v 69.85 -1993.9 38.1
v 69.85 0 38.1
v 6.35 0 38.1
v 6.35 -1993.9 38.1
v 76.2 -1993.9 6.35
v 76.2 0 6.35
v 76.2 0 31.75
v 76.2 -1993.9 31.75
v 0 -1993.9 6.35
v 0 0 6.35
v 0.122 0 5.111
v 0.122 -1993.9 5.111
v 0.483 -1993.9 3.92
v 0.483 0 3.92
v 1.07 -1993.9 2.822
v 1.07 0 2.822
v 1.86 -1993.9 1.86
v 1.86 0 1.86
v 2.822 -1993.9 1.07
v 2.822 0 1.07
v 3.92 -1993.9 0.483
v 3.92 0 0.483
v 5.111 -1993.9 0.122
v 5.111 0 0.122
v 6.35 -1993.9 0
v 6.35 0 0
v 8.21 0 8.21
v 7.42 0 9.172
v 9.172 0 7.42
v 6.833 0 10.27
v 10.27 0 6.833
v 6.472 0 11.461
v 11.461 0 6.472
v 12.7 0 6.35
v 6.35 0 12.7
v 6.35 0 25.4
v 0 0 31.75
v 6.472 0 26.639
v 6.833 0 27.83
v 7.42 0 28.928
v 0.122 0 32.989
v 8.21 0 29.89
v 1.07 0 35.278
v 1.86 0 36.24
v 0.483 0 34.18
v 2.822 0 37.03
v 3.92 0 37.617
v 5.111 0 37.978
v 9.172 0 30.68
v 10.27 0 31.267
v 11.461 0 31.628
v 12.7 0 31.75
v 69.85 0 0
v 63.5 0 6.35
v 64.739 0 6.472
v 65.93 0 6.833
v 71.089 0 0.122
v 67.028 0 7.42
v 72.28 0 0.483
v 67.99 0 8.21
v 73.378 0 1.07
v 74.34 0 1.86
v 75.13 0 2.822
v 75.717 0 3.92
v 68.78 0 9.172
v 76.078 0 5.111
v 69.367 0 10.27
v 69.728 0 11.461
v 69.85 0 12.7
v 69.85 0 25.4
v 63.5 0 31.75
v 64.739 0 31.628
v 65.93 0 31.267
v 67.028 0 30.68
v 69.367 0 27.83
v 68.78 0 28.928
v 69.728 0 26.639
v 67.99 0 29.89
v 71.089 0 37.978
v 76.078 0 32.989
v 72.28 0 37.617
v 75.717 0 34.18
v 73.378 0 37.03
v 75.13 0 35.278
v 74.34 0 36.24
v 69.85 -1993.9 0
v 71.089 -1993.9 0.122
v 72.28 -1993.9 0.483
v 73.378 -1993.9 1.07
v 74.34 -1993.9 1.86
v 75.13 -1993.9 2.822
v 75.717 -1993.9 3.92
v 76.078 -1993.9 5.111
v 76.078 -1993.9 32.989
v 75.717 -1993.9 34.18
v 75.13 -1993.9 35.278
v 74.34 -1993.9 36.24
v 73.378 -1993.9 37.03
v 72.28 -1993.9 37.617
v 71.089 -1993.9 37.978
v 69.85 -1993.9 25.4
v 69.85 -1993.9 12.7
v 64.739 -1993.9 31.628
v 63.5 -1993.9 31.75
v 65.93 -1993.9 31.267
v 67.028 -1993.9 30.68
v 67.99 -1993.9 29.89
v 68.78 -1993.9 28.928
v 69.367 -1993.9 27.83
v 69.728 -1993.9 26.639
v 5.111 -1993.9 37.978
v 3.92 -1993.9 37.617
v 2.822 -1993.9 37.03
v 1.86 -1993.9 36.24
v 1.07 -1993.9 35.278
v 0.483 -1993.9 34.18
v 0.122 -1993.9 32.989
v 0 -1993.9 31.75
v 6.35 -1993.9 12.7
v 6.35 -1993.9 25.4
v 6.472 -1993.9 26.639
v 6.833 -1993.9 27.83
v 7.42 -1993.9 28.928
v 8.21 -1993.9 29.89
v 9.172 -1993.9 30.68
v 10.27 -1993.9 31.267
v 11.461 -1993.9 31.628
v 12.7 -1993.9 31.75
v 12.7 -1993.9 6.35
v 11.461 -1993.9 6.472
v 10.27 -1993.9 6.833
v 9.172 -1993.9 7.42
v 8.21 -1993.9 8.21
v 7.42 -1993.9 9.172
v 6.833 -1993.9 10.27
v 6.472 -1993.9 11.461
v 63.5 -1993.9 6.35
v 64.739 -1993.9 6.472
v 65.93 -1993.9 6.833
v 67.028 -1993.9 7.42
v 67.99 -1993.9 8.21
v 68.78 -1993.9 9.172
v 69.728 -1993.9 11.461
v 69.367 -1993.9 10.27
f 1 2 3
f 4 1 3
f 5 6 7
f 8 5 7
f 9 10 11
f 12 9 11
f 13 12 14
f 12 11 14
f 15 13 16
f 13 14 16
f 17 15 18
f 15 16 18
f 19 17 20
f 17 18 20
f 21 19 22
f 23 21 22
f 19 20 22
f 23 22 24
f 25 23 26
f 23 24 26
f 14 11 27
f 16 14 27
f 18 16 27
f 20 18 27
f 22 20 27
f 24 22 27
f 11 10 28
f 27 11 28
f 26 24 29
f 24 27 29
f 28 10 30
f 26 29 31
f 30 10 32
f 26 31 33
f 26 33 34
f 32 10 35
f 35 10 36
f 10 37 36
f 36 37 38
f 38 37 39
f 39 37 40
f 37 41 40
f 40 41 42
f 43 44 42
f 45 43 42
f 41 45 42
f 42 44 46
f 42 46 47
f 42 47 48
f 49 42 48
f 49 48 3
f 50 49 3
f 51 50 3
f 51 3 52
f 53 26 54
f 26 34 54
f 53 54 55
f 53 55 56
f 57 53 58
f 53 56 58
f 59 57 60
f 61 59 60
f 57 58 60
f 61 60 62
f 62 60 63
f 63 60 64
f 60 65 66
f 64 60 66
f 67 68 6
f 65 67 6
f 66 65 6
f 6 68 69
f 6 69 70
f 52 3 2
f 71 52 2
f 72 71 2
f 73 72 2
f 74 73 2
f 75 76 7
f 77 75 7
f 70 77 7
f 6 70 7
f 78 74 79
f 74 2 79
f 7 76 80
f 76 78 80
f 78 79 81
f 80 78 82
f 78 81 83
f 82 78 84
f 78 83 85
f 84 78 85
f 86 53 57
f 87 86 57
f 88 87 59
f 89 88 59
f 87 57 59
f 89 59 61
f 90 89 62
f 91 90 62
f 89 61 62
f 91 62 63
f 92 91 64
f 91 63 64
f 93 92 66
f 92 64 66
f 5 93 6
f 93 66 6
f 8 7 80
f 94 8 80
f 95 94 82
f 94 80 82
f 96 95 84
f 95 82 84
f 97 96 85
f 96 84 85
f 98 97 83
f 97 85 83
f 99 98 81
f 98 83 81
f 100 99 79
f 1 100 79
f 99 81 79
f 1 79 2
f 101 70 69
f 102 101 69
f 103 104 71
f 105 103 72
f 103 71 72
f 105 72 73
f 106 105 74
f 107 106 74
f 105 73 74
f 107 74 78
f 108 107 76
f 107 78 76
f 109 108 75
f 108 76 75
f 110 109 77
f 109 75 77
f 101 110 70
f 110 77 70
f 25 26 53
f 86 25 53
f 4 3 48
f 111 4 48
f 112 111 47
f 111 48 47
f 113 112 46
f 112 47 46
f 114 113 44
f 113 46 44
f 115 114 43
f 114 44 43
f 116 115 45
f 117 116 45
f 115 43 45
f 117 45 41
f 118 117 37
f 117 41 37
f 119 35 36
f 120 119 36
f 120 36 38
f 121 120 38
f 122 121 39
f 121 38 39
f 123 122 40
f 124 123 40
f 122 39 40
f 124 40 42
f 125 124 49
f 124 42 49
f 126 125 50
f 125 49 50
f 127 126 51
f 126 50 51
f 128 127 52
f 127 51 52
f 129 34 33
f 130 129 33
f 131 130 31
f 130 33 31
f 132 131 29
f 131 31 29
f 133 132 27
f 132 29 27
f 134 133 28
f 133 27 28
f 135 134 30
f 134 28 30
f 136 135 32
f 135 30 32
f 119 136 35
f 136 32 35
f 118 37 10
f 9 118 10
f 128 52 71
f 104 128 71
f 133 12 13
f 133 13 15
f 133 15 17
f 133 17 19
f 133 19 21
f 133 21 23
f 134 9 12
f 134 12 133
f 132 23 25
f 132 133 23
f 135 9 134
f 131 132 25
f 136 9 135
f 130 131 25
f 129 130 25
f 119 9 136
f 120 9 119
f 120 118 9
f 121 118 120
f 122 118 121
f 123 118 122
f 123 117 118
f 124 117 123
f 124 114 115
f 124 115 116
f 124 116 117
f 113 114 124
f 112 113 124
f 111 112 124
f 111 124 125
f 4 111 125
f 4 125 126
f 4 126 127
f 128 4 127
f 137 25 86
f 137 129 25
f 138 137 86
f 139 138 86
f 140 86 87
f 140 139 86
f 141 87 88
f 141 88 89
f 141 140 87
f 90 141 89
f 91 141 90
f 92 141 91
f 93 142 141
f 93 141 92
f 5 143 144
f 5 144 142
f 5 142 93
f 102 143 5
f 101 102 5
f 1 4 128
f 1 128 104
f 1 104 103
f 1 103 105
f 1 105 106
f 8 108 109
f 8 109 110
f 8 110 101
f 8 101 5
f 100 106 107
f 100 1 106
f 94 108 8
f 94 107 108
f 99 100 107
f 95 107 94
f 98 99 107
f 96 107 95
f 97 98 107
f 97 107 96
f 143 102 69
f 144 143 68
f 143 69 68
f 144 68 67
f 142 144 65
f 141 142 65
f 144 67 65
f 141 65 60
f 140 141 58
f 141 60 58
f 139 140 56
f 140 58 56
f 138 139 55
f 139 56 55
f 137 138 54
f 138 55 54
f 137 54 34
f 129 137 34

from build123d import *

# Parameters (mm, degrees)
F1_DEPTH = 1993.9


with BuildPart() as f1:
    # F0 (on Front) → F1 (new body)
    with BuildSketch(Plane.XZ):
        with BuildLine():
            ThreePointArc((0, 6.35), (1.859872, 1.859872), (6.35, 0))
            Line((6.35, 0), (69.85, 0))
            ThreePointArc((69.85, 0), (74.340128, 1.859872), (76.2, 6.35))
            Line((76.2, 6.35), (76.2, 31.75))
            ThreePointArc((76.2, 31.75), (74.340128, 36.240128), (69.85, 38.1))
            Line((69.85, 38.1), (6.35, 38.1))
            ThreePointArc((6.35, 38.1), (1.859872, 36.240128), (0, 31.75))
            Line((0, 31.75), (0, 6.35))
        make_face()
        with BuildLine():
            Line((63.5, 6.35), (12.7, 6.35))
            ThreePointArc((12.7, 6.35), (8.209872, 8.209872), (6.35, 12.7))
            Line((6.35, 12.7), (6.35, 25.4))
            ThreePointArc((6.35, 25.4), (8.209872, 29.890128), (12.7, 31.75))
            Line((12.7, 31.75), (63.5, 31.75))
            ThreePointArc((63.5, 31.75), (67.990128, 29.890128), (69.85, 25.4))
            Line((69.85, 25.4), (69.85, 12.7))
            ThreePointArc((69.85, 12.7), (67.990128, 8.209872), (63.5, 6.35))
        make_face(mode=Mode.SUBTRACT)
    extrude(amount=F1_DEPTH)


solid = f1.part
